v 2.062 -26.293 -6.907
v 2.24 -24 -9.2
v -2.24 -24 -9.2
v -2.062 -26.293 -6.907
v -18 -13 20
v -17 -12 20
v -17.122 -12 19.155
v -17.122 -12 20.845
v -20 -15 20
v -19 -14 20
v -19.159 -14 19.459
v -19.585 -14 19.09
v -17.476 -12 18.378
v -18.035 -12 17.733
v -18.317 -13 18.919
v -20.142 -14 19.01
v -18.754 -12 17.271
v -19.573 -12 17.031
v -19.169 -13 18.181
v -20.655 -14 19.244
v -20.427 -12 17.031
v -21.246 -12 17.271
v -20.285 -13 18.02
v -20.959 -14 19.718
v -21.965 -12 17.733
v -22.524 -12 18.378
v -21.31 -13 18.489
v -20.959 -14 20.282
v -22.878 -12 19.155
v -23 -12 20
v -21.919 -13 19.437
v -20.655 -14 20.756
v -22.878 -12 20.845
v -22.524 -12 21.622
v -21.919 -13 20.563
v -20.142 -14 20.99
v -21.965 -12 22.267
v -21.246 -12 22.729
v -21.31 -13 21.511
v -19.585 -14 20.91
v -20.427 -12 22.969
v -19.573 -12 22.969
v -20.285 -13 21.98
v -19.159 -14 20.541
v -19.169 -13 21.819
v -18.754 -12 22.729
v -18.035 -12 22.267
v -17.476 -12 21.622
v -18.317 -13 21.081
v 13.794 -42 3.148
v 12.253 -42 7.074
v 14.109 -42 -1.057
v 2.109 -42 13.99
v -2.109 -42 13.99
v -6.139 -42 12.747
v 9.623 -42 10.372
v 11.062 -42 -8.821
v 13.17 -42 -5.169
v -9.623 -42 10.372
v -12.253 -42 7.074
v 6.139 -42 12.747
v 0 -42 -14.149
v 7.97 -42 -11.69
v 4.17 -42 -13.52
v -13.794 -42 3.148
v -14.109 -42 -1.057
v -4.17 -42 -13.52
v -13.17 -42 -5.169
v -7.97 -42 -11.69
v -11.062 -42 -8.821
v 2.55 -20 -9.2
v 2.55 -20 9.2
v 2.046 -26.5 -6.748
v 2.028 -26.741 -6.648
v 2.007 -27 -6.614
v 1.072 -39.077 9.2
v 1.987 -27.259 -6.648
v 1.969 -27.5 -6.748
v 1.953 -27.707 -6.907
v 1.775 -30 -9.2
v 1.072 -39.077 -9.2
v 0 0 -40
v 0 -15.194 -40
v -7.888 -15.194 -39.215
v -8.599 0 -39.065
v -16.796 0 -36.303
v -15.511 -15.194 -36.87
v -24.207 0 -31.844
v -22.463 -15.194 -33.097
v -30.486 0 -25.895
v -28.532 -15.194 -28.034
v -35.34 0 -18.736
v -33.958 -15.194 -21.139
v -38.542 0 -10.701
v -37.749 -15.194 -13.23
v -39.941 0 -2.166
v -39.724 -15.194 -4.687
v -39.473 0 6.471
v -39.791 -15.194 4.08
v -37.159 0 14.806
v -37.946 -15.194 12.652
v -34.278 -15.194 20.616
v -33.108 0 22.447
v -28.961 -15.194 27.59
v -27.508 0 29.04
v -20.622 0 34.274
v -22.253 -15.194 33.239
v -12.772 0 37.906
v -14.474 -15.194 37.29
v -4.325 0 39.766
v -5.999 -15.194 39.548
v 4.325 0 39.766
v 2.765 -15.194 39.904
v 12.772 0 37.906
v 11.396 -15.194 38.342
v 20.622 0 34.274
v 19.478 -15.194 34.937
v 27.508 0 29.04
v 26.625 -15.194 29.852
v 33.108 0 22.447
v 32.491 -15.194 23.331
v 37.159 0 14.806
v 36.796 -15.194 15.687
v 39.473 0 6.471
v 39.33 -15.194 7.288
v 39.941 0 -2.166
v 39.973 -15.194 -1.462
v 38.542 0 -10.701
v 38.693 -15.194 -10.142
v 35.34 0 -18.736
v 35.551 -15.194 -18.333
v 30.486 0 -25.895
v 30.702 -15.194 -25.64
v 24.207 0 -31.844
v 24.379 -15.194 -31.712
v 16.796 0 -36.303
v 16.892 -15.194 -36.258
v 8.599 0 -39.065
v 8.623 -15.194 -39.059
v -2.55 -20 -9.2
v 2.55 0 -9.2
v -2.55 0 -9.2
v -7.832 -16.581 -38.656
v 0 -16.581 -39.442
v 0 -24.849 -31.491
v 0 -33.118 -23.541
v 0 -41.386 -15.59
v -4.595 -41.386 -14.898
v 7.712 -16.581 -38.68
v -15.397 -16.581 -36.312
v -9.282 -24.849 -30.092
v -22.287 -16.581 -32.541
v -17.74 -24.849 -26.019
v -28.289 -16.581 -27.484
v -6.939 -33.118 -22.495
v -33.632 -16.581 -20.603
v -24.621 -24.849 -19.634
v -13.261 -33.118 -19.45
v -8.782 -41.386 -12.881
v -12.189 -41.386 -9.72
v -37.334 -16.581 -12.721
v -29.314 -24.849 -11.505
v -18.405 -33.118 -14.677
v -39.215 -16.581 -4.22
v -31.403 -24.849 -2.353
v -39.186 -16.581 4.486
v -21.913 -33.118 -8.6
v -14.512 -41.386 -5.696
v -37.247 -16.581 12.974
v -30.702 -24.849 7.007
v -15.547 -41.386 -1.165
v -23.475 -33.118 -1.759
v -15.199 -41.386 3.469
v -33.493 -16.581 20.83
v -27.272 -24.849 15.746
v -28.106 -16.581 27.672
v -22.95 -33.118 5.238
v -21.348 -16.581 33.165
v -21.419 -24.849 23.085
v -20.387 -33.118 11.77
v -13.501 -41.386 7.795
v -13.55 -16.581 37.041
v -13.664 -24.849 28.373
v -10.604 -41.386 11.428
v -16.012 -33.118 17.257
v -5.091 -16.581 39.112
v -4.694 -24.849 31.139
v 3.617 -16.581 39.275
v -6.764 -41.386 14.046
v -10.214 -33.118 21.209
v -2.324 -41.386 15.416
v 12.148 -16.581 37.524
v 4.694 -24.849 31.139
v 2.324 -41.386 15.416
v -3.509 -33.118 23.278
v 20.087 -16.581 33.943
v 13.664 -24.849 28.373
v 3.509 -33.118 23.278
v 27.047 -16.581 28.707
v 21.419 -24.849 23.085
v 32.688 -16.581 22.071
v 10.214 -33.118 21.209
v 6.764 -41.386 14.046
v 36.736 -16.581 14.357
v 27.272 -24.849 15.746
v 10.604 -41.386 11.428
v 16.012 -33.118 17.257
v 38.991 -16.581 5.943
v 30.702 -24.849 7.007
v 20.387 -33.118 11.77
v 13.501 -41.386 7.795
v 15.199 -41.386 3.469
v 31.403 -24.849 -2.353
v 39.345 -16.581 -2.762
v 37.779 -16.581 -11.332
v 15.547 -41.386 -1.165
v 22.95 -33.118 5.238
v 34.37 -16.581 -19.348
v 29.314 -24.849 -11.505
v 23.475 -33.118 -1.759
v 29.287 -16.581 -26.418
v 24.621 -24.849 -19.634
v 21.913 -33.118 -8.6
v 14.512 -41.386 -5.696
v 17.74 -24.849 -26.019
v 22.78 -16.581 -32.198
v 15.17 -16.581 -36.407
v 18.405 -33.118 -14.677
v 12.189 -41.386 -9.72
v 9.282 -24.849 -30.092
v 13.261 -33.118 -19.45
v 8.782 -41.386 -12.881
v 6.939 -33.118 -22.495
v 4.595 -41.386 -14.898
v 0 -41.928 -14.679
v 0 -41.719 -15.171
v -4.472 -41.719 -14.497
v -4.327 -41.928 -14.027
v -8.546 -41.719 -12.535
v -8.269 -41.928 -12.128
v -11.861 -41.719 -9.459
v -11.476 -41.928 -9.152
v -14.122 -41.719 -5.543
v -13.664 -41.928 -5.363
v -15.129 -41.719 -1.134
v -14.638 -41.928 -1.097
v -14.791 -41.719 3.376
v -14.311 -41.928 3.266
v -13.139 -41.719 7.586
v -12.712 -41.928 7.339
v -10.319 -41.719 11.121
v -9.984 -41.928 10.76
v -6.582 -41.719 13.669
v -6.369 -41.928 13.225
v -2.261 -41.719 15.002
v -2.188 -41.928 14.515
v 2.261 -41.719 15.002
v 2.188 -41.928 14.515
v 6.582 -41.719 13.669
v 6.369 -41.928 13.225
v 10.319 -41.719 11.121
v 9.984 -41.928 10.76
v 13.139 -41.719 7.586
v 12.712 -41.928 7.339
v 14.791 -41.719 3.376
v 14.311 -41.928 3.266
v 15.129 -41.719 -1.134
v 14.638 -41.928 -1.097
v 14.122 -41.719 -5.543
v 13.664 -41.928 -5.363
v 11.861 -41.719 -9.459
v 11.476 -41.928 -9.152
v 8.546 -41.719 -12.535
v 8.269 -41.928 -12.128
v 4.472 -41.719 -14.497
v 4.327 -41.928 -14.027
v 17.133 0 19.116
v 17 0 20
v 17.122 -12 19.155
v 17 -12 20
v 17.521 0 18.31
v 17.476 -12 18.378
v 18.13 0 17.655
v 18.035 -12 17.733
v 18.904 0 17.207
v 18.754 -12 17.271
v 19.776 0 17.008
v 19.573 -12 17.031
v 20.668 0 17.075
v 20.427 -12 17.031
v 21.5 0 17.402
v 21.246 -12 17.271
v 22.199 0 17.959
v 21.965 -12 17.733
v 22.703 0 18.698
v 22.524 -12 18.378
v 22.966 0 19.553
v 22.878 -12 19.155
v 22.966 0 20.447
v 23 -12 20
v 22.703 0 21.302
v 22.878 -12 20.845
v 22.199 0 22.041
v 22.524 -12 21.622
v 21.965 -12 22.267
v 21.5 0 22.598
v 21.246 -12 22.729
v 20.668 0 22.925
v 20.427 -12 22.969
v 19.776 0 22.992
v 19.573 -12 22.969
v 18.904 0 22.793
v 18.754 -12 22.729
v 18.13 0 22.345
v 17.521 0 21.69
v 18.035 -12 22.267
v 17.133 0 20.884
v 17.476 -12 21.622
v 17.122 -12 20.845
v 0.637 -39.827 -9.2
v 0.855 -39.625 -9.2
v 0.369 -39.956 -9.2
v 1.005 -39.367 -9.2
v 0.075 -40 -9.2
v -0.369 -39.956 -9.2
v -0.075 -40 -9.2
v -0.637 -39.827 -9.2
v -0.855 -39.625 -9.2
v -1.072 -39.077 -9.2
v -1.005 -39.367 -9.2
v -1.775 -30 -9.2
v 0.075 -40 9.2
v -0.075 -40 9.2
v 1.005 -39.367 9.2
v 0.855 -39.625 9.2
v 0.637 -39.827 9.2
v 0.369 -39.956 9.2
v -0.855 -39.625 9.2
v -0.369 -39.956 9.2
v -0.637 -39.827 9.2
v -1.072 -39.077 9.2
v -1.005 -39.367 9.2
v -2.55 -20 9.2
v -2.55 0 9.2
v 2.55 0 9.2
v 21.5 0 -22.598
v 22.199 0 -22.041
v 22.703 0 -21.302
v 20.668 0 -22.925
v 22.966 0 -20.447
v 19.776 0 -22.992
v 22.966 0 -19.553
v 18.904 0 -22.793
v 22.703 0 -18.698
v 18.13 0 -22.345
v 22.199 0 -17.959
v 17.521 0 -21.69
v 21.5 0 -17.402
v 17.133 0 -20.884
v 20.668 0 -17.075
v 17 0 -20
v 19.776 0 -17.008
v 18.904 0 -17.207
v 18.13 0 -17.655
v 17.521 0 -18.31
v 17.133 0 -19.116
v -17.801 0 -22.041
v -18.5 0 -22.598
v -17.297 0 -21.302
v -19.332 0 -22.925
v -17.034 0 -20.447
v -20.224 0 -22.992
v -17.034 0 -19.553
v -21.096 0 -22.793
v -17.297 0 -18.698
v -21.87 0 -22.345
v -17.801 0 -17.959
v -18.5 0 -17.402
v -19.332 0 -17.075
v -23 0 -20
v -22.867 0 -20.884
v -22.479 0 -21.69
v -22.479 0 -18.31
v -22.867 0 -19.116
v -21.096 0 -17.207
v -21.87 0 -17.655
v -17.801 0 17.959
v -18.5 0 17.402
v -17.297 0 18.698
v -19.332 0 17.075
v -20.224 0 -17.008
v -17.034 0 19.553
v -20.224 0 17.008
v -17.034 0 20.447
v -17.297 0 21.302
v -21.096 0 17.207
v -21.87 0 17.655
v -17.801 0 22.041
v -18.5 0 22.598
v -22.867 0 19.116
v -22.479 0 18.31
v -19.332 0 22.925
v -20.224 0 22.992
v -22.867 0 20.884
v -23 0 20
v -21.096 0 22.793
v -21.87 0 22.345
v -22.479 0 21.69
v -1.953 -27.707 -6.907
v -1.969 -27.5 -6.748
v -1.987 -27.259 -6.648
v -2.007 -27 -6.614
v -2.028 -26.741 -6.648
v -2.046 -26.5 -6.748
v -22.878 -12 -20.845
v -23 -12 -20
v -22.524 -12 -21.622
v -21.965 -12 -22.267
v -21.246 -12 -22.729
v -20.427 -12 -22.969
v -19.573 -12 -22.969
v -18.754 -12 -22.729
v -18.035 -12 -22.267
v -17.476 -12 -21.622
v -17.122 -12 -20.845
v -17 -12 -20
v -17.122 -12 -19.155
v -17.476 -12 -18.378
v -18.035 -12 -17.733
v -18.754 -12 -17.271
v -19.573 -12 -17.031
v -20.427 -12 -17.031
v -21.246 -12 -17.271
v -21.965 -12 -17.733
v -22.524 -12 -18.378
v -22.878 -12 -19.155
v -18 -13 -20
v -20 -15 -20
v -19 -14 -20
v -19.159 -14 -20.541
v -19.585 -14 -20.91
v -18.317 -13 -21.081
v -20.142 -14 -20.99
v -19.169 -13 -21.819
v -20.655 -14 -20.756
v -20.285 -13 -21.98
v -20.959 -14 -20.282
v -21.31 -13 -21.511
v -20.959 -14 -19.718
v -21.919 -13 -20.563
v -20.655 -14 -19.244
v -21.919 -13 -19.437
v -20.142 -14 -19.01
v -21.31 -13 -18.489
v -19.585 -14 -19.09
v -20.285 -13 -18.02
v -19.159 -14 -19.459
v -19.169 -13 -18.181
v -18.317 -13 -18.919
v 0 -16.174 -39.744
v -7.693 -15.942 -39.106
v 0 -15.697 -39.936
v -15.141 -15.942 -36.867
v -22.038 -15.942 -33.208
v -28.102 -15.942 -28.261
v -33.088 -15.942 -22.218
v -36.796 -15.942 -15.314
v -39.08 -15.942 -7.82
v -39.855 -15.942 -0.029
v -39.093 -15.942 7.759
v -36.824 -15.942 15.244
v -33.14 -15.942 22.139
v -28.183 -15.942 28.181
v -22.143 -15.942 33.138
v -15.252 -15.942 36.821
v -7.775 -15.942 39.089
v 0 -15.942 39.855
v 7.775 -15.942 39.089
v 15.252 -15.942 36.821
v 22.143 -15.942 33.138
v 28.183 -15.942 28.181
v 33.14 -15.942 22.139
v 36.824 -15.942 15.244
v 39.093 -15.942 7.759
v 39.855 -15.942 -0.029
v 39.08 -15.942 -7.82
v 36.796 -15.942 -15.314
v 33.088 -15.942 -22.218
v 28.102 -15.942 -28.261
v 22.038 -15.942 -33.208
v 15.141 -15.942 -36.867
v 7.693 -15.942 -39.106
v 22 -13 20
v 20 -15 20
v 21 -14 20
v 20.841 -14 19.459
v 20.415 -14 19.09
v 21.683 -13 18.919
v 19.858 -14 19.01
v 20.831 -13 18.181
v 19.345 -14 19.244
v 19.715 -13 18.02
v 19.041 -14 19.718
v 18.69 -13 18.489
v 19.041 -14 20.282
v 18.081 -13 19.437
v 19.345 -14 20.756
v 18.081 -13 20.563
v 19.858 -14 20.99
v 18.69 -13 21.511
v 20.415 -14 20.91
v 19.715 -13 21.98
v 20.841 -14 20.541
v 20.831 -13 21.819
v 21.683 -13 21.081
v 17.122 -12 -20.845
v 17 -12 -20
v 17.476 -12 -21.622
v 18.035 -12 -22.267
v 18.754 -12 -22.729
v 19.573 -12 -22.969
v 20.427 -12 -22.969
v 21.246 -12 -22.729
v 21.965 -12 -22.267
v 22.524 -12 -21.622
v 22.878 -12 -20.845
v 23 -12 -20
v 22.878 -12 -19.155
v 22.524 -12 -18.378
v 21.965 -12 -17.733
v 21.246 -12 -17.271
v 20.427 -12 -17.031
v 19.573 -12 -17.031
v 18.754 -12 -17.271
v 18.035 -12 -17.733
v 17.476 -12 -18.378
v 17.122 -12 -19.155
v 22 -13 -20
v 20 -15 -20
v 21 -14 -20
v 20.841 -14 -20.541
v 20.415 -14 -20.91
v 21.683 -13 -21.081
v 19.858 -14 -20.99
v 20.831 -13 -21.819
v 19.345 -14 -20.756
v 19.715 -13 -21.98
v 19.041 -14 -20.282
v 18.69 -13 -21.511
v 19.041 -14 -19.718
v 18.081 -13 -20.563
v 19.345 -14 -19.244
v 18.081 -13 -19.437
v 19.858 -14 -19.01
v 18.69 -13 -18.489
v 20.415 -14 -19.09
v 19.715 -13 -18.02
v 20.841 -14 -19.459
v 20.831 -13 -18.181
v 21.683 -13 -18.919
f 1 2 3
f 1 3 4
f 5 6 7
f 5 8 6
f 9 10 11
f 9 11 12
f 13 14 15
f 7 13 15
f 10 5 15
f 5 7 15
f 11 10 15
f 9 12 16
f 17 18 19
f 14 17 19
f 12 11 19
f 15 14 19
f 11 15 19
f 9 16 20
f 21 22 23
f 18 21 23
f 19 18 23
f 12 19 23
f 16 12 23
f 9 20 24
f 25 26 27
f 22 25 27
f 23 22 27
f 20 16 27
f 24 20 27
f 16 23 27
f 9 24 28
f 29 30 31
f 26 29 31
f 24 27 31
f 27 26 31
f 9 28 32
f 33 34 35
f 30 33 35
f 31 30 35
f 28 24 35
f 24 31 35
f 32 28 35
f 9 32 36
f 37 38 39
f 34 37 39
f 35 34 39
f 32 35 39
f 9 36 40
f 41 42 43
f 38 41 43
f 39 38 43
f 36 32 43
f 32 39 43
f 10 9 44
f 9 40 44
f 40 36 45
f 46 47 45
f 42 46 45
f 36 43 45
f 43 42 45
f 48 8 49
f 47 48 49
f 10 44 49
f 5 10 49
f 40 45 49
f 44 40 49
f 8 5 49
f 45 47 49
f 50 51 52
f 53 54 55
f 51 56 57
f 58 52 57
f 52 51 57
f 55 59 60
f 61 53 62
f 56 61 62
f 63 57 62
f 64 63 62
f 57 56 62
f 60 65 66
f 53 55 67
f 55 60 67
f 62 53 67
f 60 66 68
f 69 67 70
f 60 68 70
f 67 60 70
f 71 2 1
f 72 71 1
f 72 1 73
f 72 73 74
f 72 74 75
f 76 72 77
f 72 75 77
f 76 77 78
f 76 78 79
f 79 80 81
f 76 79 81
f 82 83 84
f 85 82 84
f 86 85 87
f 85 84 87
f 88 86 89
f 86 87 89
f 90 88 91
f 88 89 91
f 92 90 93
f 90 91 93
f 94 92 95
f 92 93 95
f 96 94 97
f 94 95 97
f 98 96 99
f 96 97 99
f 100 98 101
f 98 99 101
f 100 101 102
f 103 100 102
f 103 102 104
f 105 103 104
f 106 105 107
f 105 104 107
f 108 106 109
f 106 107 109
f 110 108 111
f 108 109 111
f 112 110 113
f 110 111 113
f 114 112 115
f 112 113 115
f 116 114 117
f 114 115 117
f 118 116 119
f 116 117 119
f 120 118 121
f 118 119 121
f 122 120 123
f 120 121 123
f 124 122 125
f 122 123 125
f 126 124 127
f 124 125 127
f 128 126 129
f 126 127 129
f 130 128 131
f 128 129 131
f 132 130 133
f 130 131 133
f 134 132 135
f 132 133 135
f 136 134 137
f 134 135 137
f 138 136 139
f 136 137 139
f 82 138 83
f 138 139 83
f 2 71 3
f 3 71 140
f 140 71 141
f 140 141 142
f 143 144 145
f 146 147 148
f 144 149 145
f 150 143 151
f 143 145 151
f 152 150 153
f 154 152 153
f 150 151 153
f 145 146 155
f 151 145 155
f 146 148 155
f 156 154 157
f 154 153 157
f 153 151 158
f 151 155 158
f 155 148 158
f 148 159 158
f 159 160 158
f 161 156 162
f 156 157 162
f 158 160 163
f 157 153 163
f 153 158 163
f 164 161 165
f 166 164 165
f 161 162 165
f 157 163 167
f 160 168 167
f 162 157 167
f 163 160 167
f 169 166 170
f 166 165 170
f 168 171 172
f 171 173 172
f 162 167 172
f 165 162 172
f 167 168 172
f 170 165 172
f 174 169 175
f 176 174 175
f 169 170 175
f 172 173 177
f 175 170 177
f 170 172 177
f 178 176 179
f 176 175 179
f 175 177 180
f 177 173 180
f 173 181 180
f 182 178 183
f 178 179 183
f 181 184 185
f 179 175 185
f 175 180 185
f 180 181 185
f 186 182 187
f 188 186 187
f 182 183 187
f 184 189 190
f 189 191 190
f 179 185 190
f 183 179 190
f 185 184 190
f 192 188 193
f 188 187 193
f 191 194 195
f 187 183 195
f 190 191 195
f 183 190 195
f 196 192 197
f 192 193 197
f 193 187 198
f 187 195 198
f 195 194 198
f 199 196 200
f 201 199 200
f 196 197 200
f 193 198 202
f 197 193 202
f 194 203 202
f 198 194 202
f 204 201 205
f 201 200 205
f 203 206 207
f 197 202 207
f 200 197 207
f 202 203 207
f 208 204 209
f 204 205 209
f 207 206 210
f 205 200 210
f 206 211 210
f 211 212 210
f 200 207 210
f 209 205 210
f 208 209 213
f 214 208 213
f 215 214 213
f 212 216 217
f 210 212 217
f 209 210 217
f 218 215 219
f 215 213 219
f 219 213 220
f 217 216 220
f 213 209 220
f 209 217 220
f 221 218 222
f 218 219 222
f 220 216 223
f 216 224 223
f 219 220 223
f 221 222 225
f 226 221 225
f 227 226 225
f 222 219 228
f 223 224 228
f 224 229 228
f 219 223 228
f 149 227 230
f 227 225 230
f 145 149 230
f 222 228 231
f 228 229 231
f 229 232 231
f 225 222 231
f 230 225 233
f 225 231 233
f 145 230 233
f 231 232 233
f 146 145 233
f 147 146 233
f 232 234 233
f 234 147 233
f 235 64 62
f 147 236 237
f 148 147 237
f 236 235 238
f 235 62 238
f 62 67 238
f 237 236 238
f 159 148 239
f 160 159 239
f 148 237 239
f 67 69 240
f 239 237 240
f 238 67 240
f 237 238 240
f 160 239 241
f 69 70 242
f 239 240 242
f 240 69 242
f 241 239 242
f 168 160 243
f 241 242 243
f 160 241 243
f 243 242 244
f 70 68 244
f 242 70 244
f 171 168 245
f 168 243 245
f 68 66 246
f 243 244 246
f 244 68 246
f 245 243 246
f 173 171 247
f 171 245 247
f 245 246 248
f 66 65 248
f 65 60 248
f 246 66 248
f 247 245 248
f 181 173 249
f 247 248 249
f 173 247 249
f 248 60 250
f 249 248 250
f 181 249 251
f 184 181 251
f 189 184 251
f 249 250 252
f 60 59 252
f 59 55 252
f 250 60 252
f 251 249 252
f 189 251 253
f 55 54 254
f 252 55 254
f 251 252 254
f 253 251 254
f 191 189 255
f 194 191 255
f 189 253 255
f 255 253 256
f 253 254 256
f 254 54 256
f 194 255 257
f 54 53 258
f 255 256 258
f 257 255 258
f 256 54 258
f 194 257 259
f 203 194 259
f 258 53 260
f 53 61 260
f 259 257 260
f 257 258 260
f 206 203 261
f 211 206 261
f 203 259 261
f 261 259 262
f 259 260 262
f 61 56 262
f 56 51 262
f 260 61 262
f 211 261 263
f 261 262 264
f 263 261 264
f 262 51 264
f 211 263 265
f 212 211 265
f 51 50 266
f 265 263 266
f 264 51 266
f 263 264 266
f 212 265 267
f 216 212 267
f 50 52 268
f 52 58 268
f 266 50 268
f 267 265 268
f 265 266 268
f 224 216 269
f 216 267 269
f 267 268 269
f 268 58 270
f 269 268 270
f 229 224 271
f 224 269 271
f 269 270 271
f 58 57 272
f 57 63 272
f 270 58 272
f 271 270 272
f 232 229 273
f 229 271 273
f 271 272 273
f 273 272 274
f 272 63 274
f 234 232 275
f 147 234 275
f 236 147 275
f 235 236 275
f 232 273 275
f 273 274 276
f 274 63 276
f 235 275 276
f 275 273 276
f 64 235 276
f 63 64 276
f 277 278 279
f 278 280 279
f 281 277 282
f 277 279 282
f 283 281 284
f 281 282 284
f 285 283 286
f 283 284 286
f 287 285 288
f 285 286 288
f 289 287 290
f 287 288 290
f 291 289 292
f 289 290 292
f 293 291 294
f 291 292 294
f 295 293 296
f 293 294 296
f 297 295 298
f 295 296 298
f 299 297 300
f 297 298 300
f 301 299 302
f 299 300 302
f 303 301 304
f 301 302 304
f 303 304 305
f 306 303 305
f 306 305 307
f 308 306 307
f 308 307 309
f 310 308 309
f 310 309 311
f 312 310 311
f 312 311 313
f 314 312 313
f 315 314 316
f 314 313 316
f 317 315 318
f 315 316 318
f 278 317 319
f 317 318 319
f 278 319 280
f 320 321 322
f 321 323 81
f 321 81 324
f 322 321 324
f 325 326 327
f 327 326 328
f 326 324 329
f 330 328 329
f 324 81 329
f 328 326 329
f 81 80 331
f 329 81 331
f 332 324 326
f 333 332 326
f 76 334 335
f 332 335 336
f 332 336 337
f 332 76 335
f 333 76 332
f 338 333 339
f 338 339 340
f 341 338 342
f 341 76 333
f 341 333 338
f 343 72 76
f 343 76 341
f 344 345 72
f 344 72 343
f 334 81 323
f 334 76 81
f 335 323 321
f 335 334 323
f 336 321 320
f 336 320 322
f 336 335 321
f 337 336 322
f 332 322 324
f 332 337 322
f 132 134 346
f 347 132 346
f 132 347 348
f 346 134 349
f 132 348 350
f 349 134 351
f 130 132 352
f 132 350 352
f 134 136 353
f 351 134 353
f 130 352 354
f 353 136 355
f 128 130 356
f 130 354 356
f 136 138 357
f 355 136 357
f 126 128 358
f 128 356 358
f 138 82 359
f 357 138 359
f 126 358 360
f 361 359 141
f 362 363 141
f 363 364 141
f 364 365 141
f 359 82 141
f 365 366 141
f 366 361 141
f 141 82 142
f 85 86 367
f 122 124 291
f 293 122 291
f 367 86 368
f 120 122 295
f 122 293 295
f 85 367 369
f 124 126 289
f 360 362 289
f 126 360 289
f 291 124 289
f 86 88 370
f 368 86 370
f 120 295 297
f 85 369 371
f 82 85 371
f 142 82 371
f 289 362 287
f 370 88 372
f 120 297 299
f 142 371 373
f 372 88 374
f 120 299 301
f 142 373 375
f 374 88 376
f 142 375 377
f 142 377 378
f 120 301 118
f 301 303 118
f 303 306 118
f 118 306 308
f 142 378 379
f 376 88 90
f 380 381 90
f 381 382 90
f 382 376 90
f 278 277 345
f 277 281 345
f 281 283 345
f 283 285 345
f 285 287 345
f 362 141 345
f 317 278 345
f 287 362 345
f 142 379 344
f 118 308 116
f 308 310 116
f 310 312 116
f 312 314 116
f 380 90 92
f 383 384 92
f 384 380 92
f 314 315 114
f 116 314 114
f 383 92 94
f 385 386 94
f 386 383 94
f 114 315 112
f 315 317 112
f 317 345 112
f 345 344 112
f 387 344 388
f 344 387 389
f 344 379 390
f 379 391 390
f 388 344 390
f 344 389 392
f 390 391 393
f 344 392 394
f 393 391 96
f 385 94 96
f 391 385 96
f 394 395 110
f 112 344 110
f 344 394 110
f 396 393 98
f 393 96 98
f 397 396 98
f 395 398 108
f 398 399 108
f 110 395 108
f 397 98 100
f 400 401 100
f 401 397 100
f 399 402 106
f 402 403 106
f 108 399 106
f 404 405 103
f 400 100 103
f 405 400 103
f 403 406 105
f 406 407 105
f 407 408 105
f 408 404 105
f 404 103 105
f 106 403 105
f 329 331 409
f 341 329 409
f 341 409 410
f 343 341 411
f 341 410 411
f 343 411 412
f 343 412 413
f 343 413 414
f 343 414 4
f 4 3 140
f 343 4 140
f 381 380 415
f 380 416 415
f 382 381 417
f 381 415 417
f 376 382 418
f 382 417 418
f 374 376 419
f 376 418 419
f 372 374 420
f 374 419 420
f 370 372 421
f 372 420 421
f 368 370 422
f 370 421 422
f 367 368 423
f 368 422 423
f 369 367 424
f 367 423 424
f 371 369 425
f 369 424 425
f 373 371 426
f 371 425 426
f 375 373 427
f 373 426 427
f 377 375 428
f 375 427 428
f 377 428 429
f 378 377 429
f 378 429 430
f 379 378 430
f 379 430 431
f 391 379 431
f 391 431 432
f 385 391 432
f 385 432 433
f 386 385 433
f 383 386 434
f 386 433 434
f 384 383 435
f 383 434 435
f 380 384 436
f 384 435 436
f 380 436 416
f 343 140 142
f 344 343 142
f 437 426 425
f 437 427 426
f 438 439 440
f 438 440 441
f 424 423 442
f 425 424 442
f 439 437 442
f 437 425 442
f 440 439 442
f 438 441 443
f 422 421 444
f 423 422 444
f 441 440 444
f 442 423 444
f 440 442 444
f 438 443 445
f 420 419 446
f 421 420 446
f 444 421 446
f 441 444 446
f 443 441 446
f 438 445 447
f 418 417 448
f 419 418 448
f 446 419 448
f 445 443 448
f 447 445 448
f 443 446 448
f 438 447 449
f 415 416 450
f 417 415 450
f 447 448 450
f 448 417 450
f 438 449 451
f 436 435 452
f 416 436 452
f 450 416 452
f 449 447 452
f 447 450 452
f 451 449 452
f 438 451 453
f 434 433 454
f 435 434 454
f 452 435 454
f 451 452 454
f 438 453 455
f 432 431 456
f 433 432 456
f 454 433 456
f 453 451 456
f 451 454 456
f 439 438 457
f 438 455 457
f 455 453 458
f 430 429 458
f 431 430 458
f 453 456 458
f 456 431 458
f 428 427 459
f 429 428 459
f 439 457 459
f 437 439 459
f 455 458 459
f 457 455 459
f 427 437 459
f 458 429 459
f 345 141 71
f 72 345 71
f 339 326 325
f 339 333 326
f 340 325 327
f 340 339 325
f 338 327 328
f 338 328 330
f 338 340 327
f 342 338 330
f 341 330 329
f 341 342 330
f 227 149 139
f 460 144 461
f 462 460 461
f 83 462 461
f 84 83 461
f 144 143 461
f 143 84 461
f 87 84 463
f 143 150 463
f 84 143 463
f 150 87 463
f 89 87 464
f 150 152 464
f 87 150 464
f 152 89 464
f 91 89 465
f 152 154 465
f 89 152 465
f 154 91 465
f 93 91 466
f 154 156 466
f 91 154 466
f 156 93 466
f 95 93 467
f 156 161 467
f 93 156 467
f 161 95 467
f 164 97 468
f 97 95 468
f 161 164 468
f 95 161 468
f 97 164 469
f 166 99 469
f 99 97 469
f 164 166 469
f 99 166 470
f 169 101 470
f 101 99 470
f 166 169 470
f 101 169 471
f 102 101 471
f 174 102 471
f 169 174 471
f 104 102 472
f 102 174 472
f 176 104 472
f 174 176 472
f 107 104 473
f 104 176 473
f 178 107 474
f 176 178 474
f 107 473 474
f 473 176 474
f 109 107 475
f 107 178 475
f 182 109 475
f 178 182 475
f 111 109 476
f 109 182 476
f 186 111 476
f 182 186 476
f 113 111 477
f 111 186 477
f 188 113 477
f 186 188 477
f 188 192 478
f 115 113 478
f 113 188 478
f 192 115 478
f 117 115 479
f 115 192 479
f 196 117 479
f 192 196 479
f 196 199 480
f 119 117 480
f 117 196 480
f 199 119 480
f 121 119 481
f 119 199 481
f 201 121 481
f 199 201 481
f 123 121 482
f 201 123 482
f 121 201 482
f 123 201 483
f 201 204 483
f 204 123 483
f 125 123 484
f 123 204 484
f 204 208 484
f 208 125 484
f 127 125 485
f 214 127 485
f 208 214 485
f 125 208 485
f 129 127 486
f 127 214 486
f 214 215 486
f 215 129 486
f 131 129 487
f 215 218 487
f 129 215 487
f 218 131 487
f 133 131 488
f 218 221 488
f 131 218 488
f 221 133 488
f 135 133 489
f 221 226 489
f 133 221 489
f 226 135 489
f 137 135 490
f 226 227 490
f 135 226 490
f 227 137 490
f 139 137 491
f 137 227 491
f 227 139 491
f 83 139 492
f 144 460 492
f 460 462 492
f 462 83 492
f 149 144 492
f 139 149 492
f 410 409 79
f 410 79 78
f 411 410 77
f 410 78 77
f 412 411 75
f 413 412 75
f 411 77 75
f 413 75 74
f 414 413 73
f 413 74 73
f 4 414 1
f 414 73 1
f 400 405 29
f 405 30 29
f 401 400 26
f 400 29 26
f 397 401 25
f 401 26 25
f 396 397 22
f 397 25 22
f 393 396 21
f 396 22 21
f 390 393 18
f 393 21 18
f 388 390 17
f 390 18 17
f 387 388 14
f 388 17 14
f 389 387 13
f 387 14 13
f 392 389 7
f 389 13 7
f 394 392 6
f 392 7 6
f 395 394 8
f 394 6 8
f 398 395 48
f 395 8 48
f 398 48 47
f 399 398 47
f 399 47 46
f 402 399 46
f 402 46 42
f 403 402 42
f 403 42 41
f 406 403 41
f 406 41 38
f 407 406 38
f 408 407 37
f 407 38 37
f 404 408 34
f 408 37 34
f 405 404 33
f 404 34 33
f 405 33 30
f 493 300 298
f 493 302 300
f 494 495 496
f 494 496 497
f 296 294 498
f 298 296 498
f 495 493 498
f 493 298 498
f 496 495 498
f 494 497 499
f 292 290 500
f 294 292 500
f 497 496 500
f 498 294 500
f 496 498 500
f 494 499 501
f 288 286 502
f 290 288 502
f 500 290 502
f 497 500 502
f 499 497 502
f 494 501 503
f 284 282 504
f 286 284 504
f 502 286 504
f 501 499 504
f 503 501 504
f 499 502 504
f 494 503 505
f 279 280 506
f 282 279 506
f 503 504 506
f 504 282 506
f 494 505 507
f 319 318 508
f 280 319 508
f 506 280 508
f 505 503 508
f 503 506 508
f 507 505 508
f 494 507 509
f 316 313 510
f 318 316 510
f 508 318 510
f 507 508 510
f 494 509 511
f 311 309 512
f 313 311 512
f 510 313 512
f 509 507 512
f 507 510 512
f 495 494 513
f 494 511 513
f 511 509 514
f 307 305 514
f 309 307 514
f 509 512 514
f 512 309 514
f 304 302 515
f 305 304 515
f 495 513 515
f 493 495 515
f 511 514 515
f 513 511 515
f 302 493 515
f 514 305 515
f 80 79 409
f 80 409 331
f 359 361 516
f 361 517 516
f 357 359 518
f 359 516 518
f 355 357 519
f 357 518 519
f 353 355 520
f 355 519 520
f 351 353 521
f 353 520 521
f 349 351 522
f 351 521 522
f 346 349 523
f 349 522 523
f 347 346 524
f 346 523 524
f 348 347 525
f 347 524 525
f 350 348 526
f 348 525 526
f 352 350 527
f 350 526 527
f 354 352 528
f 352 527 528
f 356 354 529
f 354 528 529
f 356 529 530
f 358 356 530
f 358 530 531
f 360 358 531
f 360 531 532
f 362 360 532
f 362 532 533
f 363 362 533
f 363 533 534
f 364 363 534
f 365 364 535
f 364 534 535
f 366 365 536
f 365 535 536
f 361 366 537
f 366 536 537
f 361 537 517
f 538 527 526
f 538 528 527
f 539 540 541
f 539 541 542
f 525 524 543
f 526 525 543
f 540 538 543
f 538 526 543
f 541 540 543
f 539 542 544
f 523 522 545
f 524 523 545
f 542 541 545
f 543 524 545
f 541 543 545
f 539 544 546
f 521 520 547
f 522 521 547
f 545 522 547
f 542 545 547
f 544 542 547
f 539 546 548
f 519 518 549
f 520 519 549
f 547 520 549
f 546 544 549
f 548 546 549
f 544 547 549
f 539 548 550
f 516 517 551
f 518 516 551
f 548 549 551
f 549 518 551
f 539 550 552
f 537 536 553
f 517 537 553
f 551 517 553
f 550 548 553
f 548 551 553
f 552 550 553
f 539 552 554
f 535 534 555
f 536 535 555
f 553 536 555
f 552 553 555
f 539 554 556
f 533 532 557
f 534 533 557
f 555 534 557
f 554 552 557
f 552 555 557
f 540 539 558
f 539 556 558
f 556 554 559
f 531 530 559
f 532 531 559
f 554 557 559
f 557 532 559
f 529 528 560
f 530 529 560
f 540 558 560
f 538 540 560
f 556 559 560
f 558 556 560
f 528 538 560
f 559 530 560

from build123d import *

# Parameters (mm, degrees)
F_6_0MM_DOWEL_HOLE7_D     = 6
F_6_0MM_DOWEL_HOLE7_DEPTH = 12
F_6_0MM_DOWEL_HOLE7_TIP   = 3
CUT_EXTRUDE1_DEPTH        = 9.2
CUT_EXTRUDE1_DEPTH_BACK   = 9.2
FILLET1_R                 = 2
FILLET2_R                 = 2
FILLET6_R                 = 1
FILLET7_R                 = 1
BOSS_EXTRUDE1_DEPTH       = 10
BOSS_EXTRUDE1_DEPTH_BACK  = 10
FILLET8_R                 = 1


with BuildPart() as part:
    # Sketch1 → Revolve1 (revolve)
    with BuildSketch(Plane.XY):
        Polygon((0, 0), (40, 0), (40, -16), (15, -42), (0, -42), align=None)
    revolve(axis=Axis((0, -42, 0), (0, 1, 0)))

    # Ø6.0mm Dowel Hole7
    with Locations(Plane(origin=(0, 0, 0), x_dir=(1, 0, 0), z_dir=(0, 1, 0))):
        with Locations((20, -20), (-20, 20), (-20, -20), (20, 20)):
            Hole(F_6_0MM_DOWEL_HOLE7_D / 2, depth=F_6_0MM_DOWEL_HOLE7_DEPTH)
            with Locations((0, 0, -(F_6_0MM_DOWEL_HOLE7_DEPTH + F_6_0MM_DOWEL_HOLE7_TIP / 2))):  # 90° drill point
                Cone(0, F_6_0MM_DOWEL_HOLE7_D / 2, F_6_0MM_DOWEL_HOLE7_TIP, mode=Mode.SUBTRACT)

    # Sketch13 → Cut-Extrude1 (cut, two sides: drawn at the far end of the back side and taken through both)
    with BuildSketch(Plane.XY.offset(-CUT_EXTRUDE1_DEPTH_BACK)):
        Polygon((-2.55, 0), (2.55, 0), (2.55, -20), (1, -40), (-1, -40), (-2.55, -20), align=None)
    extrude(amount=CUT_EXTRUDE1_DEPTH + CUT_EXTRUDE1_DEPTH_BACK, mode=Mode.SUBTRACT)

    # Fillet1
    fillet1_edges = [part.edges().sort_by_distance(p)[0] for p in [
        (-15, -42, 0),
    ]]
    fillet(fillet1_edges, radius=FILLET1_R)

    # Fillet2
    fillet2_edges = [part.edges().sort_by_distance(p)[0] for p in [
        (-40, -16, 0),
    ]]
    fillet(fillet2_edges, radius=FILLET2_R)

    # Fillet6
    fillet6_edges = [part.edges().sort_by_distance(p)[0] for p in [
        (1, -40, 0),
    ]]
    fillet(fillet6_edges, radius=FILLET6_R)

    # Fillet7
    fillet7_edges = [part.edges().sort_by_distance(p)[0] for p in [
        (-1, -40, 0),
    ]]
    fillet(fillet7_edges, radius=FILLET7_R)

    # Sketch14 → Boss-Extrude1 (add, two sides: drawn at the far end of the back side and taken through both)
    with BuildSketch(Plane(origin=(0, 0, 0), x_dir=(0, 0, -1), z_dir=(1, 0, 0)).offset(-BOSS_EXTRUDE1_DEPTH_BACK)):
        Polygon((9.2, -30), (12.2, -27), (9.2, -24), (6.2, -27), align=None)
    extrude(amount=BOSS_EXTRUDE1_DEPTH + BOSS_EXTRUDE1_DEPTH_BACK)

    # Fillet8
    fillet8_edges = [part.edges().sort_by_distance(p)[0] for p in [
        (0, -27, -6.2),
    ]]
    fillet(fillet8_edges, radius=FILLET8_R)


solid = part.part
